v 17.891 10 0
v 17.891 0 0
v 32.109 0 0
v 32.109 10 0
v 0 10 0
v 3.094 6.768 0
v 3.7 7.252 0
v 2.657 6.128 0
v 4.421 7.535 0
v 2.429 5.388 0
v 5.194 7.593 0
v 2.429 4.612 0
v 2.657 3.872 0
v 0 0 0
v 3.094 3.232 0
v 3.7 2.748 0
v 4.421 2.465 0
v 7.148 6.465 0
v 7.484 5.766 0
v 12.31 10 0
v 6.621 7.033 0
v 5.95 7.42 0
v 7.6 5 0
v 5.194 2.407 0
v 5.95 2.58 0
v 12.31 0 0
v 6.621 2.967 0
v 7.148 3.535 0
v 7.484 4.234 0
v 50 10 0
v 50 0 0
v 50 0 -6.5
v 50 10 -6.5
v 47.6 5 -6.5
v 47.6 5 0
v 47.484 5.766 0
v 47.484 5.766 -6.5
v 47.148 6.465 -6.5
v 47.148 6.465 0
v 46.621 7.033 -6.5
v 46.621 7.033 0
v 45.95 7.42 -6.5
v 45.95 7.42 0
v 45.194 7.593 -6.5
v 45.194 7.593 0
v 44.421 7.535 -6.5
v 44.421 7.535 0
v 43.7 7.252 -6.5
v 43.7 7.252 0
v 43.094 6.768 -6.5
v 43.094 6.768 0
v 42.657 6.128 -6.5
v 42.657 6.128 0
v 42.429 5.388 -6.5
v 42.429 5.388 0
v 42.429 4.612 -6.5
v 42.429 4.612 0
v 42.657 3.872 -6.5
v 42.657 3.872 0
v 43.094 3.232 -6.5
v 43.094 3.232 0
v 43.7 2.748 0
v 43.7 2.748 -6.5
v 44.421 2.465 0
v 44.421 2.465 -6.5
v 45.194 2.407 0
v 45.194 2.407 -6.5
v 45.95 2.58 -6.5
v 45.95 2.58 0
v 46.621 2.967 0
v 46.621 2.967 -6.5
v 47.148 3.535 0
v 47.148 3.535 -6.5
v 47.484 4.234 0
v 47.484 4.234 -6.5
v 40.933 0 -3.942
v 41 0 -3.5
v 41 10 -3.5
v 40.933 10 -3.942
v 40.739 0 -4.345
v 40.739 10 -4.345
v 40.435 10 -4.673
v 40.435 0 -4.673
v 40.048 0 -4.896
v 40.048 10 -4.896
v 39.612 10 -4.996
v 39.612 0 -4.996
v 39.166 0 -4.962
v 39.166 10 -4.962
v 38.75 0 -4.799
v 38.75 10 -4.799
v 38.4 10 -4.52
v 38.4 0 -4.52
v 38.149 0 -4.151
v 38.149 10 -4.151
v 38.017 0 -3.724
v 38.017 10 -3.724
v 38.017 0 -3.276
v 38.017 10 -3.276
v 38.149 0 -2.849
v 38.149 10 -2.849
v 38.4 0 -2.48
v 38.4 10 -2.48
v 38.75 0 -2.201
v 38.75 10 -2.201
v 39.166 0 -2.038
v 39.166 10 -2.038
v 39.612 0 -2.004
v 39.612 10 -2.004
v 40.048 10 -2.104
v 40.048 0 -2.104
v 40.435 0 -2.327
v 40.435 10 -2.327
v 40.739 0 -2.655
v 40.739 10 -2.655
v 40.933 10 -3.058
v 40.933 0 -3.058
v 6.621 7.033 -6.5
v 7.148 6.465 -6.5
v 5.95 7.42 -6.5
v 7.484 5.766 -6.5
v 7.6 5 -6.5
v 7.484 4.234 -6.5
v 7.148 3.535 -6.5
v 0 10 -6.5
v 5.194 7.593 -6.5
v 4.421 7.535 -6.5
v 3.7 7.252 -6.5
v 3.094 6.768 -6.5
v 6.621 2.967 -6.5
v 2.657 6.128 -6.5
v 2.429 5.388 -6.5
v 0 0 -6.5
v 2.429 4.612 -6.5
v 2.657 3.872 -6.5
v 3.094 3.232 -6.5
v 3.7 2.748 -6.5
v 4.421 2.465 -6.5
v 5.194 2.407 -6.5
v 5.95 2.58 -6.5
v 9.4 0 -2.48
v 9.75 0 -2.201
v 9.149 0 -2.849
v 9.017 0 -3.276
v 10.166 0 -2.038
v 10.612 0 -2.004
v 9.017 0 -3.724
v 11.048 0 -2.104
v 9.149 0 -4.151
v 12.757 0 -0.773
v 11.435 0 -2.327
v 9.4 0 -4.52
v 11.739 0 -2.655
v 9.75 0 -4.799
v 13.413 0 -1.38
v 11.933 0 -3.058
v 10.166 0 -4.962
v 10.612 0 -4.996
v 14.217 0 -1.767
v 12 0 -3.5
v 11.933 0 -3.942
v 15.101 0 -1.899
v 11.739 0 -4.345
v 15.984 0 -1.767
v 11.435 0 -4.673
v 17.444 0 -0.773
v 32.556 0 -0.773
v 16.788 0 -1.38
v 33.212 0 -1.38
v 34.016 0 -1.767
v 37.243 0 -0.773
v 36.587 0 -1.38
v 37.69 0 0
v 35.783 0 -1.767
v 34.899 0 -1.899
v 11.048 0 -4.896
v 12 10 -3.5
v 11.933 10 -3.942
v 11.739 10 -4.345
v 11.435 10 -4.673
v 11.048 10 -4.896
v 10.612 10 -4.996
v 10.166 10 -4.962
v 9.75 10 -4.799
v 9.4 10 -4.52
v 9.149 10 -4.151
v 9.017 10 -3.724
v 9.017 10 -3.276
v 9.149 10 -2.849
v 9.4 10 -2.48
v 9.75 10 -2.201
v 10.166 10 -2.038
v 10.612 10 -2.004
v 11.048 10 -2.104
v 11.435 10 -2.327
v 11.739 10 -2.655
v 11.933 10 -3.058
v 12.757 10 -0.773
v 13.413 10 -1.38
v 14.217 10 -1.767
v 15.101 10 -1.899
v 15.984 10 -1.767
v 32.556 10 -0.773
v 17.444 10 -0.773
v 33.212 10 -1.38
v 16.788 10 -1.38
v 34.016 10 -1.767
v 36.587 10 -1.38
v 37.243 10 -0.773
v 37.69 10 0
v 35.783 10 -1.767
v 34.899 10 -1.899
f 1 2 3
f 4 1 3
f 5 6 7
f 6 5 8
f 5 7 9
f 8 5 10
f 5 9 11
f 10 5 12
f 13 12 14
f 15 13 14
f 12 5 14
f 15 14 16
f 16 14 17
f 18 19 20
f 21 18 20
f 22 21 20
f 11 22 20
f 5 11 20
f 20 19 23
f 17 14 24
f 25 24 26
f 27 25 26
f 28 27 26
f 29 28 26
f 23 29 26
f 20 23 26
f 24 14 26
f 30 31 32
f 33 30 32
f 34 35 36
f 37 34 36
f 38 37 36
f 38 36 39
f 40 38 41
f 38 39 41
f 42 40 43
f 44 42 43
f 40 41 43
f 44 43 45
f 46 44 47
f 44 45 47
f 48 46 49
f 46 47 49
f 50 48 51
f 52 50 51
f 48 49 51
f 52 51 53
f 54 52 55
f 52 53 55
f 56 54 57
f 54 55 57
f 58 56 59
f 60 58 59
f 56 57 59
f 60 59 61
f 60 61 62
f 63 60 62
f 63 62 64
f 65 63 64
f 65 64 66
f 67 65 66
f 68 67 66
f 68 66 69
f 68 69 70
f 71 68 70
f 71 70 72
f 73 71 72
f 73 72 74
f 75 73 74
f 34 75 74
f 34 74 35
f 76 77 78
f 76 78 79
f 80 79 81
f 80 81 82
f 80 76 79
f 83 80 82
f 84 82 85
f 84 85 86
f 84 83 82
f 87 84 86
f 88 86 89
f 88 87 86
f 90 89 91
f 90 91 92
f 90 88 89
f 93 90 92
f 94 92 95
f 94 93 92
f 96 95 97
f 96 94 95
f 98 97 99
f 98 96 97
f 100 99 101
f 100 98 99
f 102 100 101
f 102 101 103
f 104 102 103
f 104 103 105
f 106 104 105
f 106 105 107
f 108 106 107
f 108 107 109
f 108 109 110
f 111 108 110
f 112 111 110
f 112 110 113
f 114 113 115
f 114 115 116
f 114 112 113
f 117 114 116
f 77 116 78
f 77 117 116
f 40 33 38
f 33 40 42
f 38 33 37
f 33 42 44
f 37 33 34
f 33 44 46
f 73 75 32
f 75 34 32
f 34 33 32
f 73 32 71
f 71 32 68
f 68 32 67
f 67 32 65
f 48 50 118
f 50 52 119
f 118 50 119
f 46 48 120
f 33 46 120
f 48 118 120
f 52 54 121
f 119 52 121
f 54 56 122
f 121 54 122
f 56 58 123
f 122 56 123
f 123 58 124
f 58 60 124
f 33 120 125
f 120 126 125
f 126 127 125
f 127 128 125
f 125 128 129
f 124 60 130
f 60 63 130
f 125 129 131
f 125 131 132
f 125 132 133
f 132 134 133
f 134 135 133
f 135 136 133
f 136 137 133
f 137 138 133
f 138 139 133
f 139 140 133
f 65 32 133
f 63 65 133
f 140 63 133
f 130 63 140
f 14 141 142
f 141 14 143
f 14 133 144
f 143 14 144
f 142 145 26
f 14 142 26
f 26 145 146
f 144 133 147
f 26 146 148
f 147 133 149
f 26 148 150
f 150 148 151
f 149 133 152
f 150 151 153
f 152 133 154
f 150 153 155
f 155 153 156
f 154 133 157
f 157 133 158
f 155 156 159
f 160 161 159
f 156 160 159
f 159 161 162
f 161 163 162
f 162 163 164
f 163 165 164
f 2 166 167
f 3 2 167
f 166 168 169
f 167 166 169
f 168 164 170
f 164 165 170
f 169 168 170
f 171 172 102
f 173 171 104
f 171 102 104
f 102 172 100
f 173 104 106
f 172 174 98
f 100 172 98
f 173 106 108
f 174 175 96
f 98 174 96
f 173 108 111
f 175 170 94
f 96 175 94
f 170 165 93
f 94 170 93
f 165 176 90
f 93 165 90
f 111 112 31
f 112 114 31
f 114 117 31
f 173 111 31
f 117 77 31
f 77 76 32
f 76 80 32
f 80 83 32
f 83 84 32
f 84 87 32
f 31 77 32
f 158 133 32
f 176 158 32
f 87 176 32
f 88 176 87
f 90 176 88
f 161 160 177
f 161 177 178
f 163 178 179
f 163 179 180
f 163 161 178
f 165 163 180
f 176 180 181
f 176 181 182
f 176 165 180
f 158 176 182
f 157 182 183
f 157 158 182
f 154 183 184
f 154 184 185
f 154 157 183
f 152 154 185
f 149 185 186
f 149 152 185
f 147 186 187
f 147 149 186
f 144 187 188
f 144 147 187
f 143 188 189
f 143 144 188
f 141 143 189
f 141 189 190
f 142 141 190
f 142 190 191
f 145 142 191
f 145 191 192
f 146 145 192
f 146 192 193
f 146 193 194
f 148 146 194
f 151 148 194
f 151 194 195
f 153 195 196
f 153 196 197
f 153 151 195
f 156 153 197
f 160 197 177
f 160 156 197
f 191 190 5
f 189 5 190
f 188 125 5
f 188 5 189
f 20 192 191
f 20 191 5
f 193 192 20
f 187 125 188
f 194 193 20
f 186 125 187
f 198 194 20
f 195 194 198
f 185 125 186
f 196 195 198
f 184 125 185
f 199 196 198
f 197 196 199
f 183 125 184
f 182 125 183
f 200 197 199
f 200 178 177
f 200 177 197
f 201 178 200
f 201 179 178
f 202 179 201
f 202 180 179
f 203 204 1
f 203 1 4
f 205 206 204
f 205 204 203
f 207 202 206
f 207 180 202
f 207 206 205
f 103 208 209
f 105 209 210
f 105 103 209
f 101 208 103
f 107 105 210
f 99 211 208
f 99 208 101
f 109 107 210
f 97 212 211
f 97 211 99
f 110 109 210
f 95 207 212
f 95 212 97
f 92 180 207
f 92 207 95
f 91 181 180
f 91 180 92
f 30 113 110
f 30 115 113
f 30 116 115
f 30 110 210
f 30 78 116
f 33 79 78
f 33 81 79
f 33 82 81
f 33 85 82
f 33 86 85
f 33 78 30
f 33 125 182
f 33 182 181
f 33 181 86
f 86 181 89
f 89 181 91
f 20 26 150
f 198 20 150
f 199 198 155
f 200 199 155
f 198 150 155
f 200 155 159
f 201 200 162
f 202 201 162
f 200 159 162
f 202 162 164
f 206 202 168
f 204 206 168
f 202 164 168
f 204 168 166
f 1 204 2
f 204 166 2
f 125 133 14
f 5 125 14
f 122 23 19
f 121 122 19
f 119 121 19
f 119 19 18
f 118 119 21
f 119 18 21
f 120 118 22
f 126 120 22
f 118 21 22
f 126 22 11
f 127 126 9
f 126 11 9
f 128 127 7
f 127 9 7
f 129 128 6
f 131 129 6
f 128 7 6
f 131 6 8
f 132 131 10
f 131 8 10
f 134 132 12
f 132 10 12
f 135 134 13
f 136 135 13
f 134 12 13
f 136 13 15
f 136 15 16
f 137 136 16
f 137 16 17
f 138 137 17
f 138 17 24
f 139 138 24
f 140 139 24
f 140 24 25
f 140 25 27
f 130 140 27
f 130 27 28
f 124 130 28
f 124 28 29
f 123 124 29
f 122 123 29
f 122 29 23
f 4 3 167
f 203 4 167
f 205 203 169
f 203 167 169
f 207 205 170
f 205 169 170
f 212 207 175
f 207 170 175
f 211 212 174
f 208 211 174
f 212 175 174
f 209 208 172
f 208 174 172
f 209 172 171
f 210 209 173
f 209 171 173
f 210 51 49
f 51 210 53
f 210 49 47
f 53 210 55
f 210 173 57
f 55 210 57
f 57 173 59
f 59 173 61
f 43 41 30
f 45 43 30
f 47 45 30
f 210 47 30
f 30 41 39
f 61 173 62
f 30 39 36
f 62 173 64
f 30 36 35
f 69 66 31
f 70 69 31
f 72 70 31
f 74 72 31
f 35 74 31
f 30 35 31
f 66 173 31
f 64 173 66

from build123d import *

# Parameters (mm, degrees)
SKETCH1_R           = 1.5
BOSS_EXTRUDE1_DEPTH = 10
CUT_EXTRUDE1_REACH  = 8.5
SKETCH2_R           = 2.6


with BuildPart() as part:
    # Sketch1 → Boss-Extrude1 (new body)
    with BuildSketch(Plane(origin=(0, 0, 0), x_dir=(1, 0, 0), z_dir=(0, 1, 0))):
        with BuildLine():
            Line((0, 0), (12.309647022, 0))
            ThreePointArc((12.309647022, 0), (15.100505063, 1.899494937), (17.891363104, 0))
            Line((17.891363104, 0), (32.108636896, 0))
            ThreePointArc((32.108636896, 0), (34.899494937, 1.899494937), (37.690352978, 0))
            Line((37.690352978, 0), (50, 0))
            Line((50, 0), (50, 6.5))
            Line((50, 6.5), (0, 6.5))
            Line((0, 6.5), (0, 0))
        make_face()
        with Locations((10.5, 3.5)):
            Circle(SKETCH1_R, mode=Mode.SUBTRACT)
        with Locations((39.5, 3.5)):
            Circle(SKETCH1_R, mode=Mode.SUBTRACT)
    extrude(amount=BOSS_EXTRUDE1_DEPTH)

    # Sketch2 → Cut-Extrude1 (cut, up to next)
    with BuildSketch(Plane.XY, mode=Mode.PRIVATE) as cut_extrude1_sk1:
        with Locations((5, 5)):
            Circle(SKETCH2_R)
    cut_extrude1_tool1 = extrude(cut_extrude1_sk1.sketch, amount=-CUT_EXTRUDE1_REACH, mode=Mode.PRIVATE) & part.part
    add(cut_extrude1_tool1.solids().sort_by_distance((5, 5, 0))[0], mode=Mode.SUBTRACT)
    # Sketch2 → Cut-Extrude1 (cut, up to next)
    with BuildSketch(Plane.XY, mode=Mode.PRIVATE) as cut_extrude1_sk2:
        with Locations((45, 5)):
            Circle(SKETCH2_R)
    cut_extrude1_tool2 = extrude(cut_extrude1_sk2.sketch, amount=-CUT_EXTRUDE1_REACH, mode=Mode.PRIVATE) & part.part
    add(cut_extrude1_tool2.solids().sort_by_distance((45, 5, 0))[0], mode=Mode.SUBTRACT)


solid = part.part
